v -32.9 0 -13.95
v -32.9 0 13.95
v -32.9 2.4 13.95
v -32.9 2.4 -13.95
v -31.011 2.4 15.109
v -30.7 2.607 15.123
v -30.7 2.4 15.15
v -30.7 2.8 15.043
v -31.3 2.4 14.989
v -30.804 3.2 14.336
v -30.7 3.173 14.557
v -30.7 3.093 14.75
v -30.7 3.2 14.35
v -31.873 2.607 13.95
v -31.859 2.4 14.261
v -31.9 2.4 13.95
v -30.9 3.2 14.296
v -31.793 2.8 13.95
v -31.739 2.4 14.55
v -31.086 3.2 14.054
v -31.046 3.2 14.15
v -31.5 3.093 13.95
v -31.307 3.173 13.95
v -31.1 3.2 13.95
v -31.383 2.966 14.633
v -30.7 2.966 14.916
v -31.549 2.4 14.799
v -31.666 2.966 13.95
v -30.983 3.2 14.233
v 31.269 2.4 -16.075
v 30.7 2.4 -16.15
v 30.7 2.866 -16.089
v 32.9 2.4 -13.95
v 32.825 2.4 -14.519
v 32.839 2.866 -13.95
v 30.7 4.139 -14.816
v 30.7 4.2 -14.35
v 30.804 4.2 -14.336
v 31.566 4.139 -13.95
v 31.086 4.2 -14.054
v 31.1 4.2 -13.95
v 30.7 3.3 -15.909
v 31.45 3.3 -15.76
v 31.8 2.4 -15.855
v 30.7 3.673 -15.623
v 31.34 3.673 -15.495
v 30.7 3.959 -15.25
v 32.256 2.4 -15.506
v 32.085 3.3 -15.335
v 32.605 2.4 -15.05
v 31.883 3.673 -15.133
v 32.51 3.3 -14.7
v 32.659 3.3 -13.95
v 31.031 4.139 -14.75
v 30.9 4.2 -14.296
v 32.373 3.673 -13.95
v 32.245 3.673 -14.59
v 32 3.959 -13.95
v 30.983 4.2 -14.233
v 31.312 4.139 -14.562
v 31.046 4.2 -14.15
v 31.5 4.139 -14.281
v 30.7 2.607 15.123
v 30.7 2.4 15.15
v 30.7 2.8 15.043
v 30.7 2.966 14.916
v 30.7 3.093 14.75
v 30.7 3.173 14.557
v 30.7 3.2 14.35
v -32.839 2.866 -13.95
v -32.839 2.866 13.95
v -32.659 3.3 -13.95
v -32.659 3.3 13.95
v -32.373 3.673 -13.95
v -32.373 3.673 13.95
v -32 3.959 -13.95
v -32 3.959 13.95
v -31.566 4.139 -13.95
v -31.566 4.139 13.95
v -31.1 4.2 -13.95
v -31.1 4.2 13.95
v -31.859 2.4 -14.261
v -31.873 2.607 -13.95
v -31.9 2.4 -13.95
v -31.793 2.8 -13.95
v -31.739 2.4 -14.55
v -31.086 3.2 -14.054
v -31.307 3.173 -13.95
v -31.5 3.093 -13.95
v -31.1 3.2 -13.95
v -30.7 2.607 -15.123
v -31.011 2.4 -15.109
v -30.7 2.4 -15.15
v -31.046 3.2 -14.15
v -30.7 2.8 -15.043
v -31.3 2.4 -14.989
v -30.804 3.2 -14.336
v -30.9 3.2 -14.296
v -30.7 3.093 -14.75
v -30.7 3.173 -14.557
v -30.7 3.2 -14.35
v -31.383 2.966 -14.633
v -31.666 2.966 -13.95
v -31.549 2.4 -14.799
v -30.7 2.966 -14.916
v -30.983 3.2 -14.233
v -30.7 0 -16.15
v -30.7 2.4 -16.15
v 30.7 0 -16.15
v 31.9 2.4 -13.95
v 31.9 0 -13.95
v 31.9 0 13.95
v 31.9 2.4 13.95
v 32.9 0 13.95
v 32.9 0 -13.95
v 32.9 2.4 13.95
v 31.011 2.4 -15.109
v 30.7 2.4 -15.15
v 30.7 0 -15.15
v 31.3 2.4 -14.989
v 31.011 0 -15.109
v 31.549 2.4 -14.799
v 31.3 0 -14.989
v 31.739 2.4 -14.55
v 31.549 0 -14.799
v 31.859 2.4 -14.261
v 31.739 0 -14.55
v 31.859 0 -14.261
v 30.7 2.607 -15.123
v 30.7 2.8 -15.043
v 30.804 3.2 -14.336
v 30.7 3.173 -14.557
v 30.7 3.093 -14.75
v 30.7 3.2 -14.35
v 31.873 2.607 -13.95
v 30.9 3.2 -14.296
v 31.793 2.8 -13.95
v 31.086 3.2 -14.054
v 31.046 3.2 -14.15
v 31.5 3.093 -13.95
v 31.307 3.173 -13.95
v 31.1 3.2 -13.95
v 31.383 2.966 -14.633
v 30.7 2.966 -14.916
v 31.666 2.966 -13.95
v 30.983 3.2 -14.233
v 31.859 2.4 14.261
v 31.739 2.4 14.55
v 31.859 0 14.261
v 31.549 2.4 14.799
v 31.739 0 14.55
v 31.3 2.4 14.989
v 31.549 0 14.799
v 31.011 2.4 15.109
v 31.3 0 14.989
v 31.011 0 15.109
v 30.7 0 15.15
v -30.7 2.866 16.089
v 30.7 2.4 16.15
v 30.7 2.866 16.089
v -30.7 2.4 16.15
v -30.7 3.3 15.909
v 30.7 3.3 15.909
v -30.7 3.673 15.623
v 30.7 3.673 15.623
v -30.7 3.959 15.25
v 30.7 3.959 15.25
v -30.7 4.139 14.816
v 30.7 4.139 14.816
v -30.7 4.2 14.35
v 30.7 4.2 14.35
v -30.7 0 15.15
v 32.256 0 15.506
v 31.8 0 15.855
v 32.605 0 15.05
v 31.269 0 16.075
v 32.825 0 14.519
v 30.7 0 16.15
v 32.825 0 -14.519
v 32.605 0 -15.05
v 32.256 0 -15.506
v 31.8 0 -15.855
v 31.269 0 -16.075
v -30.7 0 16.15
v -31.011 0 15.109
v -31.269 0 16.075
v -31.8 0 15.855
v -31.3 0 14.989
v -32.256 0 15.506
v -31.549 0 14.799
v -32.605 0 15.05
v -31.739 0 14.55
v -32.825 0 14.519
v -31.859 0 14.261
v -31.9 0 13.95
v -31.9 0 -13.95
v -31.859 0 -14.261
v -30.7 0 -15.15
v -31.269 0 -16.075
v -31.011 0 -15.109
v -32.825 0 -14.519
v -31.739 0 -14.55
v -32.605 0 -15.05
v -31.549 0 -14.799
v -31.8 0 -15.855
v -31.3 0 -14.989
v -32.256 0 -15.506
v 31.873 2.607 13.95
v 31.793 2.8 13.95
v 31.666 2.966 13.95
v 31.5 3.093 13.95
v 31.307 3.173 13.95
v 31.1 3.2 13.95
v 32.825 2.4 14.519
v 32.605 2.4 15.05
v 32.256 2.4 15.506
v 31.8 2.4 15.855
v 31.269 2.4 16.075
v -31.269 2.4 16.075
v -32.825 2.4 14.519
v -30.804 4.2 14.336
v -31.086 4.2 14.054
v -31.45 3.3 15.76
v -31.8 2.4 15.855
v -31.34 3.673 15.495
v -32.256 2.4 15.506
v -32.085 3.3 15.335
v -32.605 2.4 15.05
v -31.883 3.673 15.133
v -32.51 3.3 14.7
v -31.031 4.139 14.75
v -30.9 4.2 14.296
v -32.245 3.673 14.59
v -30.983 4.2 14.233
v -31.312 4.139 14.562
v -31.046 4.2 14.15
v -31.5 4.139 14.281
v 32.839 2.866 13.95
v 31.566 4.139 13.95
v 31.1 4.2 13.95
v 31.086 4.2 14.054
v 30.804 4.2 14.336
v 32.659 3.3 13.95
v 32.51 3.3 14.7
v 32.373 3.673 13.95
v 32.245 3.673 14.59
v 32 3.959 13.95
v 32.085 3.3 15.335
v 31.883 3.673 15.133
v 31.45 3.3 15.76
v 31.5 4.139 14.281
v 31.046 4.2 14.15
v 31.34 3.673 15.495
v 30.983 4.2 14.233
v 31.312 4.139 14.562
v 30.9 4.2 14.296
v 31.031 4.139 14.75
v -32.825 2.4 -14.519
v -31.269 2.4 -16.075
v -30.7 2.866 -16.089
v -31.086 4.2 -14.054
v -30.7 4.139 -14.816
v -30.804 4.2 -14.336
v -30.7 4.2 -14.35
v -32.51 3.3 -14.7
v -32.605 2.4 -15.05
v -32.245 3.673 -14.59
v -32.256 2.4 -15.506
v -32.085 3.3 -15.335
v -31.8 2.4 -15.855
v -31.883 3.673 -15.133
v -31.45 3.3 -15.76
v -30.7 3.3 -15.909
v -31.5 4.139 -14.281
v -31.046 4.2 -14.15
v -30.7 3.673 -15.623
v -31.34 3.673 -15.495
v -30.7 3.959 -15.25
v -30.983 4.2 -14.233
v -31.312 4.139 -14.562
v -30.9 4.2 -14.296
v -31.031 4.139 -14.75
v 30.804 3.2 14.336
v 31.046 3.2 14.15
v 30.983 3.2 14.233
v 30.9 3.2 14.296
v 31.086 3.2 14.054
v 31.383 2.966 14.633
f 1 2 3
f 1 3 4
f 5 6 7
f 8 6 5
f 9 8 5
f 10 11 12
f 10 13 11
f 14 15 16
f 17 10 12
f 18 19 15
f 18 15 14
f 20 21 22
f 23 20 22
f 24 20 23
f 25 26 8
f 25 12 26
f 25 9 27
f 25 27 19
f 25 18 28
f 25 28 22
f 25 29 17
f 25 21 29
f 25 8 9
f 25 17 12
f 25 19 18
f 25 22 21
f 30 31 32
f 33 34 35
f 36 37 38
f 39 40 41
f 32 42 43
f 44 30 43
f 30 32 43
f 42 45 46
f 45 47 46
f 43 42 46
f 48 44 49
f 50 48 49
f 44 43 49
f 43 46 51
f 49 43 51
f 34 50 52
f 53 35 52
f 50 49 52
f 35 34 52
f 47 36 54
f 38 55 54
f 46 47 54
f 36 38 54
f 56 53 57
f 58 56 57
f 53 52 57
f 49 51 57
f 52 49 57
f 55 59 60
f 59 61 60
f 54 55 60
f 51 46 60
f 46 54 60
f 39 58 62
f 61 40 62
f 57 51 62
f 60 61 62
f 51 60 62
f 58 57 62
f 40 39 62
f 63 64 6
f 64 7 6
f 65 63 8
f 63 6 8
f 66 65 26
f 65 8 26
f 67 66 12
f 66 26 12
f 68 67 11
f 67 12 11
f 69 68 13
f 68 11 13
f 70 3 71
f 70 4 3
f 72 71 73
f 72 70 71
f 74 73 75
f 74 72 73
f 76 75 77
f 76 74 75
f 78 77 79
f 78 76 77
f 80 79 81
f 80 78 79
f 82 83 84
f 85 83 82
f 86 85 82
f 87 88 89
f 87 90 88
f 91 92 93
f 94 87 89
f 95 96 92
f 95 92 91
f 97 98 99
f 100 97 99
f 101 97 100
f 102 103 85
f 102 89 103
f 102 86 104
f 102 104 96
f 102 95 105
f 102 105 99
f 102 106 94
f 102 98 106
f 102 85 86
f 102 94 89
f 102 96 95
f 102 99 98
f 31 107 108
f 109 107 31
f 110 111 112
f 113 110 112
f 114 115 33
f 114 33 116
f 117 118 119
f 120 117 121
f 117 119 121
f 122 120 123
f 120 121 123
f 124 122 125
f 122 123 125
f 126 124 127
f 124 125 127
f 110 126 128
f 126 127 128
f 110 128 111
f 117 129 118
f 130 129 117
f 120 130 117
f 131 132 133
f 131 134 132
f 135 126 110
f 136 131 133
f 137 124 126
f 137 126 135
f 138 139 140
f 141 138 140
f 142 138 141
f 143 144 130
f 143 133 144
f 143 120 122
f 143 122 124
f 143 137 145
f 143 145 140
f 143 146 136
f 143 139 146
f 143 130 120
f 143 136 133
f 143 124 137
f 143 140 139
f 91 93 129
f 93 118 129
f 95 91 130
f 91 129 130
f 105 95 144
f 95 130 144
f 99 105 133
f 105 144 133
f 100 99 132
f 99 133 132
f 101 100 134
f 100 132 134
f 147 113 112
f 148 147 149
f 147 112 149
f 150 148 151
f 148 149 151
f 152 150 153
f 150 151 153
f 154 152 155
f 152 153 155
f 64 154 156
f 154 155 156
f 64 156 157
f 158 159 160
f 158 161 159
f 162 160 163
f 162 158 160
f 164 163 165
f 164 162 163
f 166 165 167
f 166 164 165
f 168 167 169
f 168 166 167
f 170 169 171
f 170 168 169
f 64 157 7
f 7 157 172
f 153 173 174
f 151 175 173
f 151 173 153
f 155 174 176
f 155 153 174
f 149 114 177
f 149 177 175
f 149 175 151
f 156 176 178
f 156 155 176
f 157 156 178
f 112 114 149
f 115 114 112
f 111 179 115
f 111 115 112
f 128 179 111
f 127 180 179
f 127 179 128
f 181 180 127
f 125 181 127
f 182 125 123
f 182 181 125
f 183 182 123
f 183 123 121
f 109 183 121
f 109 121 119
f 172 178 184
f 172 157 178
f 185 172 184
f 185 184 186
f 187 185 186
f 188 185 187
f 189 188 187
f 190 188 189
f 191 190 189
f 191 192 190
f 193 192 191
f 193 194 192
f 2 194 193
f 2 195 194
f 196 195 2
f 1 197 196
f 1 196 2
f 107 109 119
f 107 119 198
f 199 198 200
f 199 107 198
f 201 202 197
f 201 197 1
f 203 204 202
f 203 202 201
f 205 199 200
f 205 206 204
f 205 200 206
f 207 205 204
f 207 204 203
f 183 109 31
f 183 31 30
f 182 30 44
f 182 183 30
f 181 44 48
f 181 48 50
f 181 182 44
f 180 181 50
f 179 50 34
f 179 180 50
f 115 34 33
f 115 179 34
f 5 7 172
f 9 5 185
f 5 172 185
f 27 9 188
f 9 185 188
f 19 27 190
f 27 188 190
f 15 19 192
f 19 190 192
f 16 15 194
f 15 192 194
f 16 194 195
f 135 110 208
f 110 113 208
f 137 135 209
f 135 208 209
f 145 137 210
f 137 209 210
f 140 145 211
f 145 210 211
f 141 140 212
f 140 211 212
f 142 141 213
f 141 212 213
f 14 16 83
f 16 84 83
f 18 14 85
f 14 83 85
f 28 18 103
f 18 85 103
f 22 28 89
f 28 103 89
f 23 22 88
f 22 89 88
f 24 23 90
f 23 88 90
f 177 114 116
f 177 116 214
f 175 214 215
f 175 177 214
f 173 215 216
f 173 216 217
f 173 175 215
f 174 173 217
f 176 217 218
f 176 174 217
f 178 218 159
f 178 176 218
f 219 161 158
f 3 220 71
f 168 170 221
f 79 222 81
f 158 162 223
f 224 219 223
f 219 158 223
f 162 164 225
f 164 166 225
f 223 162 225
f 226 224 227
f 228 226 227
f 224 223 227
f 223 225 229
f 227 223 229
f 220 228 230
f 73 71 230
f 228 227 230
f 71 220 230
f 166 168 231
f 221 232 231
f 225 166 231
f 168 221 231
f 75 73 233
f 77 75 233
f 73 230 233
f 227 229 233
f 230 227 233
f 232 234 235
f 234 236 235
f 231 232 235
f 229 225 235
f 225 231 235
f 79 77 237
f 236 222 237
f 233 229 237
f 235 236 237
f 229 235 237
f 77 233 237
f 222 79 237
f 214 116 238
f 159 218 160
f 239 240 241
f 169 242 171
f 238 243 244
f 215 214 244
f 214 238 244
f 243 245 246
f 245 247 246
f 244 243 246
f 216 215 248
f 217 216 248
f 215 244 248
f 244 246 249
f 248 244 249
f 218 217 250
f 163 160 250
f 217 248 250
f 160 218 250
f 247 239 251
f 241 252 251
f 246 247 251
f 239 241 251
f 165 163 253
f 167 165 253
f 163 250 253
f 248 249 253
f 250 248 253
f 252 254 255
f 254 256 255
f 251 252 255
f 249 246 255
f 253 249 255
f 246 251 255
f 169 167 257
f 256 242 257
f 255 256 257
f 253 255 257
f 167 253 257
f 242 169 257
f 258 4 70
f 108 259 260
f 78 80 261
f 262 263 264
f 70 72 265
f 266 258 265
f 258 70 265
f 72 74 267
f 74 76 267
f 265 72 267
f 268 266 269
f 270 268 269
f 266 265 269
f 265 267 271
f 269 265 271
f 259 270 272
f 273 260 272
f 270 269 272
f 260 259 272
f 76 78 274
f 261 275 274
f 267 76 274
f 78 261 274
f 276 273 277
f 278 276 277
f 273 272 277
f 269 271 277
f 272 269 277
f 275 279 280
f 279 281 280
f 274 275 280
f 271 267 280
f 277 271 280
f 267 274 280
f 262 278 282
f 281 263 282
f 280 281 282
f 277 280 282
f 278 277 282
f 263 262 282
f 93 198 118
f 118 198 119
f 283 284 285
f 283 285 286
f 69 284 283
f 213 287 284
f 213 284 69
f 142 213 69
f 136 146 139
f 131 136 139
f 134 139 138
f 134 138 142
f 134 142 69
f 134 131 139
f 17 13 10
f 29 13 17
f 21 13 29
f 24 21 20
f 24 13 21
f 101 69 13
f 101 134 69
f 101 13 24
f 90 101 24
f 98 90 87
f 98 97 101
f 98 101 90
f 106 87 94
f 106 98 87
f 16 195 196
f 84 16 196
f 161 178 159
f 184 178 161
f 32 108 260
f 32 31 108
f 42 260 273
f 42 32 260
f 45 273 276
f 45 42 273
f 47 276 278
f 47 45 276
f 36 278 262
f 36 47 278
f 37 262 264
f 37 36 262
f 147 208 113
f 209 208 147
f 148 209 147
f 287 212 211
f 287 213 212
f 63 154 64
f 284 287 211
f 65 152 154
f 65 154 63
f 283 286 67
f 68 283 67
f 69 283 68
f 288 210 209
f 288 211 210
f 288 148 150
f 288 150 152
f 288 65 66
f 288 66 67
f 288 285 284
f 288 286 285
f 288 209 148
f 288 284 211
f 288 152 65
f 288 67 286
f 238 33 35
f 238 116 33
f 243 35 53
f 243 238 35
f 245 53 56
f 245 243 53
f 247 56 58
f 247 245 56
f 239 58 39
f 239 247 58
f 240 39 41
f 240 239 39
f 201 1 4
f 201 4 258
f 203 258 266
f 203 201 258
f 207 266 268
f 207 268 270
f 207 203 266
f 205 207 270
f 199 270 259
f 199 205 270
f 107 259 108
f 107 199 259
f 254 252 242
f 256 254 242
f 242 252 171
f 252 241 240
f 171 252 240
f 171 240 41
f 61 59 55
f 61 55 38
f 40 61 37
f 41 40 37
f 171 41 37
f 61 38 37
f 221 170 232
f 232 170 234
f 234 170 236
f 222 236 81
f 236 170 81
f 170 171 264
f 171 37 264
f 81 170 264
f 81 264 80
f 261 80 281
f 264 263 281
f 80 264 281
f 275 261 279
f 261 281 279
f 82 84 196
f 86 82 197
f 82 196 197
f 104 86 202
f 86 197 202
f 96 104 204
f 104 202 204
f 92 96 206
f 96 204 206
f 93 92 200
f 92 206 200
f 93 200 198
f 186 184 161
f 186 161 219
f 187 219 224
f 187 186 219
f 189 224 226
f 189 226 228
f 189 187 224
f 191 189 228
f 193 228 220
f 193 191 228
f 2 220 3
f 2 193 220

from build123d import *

# Parameters (mm, degrees)
EXTRUDE_1_DEPTH = 4.2
FILLET_1_R      = 1.8
SHELL_1_T       = -1


with BuildPart() as part:
    # 草图1 → 凸台-拉伸1 (new body)
    with BuildSketch(Plane(origin=(0, 0, 0), x_dir=(1, 0, 0), z_dir=(0, 1, 0))):
        with BuildLine():
            Line((-30.7, 16.15), (30.7, 16.15))
            ThreePointArc((30.7, 16.15), (32.255634919, 15.505634919), (32.9, 13.95))
            Line((32.9, 13.95), (32.9, -13.95))
            ThreePointArc((32.9, -13.95), (32.255634919, -15.505634919), (30.7, -16.15))
            Line((30.7, -16.15), (-30.7, -16.15))
            ThreePointArc((-30.7, -16.15), (-32.255634919, -15.505634919), (-32.9, -13.95))
            Line((-32.9, -13.95), (-32.9, 13.95))
            ThreePointArc((-32.9, 13.95), (-32.255634919, 15.505634919), (-30.7, 16.15))
        make_face()
    extrude(amount=EXTRUDE_1_DEPTH)

    # 圆角1
    fillet_1_edges = [part.edges().sort_by_distance(p)[0] for p in [
        (32.255634919, 4.2, 15.505634919),
        (32.9, 4.2, 0),
        (32.255634919, 4.2, -15.505634919),
        (0, 4.2, -16.15),
        (-32.255634919, 4.2, -15.505634919),
        (-32.9, 4.2, 0),
        (-32.255634919, 4.2, 15.505634919),
        (0, 4.2, 16.15),
    ]]
    fillet(fillet_1_edges, radius=FILLET_1_R)

    # 抽壳1
    shell_1_openings = [part.faces().sort_by_distance(p)[0] for p in [
        (0, 0, 0),
    ]]
    offset(amount=SHELL_1_T, openings=shell_1_openings, kind=Kind.INTERSECTION)


solid = part.part
